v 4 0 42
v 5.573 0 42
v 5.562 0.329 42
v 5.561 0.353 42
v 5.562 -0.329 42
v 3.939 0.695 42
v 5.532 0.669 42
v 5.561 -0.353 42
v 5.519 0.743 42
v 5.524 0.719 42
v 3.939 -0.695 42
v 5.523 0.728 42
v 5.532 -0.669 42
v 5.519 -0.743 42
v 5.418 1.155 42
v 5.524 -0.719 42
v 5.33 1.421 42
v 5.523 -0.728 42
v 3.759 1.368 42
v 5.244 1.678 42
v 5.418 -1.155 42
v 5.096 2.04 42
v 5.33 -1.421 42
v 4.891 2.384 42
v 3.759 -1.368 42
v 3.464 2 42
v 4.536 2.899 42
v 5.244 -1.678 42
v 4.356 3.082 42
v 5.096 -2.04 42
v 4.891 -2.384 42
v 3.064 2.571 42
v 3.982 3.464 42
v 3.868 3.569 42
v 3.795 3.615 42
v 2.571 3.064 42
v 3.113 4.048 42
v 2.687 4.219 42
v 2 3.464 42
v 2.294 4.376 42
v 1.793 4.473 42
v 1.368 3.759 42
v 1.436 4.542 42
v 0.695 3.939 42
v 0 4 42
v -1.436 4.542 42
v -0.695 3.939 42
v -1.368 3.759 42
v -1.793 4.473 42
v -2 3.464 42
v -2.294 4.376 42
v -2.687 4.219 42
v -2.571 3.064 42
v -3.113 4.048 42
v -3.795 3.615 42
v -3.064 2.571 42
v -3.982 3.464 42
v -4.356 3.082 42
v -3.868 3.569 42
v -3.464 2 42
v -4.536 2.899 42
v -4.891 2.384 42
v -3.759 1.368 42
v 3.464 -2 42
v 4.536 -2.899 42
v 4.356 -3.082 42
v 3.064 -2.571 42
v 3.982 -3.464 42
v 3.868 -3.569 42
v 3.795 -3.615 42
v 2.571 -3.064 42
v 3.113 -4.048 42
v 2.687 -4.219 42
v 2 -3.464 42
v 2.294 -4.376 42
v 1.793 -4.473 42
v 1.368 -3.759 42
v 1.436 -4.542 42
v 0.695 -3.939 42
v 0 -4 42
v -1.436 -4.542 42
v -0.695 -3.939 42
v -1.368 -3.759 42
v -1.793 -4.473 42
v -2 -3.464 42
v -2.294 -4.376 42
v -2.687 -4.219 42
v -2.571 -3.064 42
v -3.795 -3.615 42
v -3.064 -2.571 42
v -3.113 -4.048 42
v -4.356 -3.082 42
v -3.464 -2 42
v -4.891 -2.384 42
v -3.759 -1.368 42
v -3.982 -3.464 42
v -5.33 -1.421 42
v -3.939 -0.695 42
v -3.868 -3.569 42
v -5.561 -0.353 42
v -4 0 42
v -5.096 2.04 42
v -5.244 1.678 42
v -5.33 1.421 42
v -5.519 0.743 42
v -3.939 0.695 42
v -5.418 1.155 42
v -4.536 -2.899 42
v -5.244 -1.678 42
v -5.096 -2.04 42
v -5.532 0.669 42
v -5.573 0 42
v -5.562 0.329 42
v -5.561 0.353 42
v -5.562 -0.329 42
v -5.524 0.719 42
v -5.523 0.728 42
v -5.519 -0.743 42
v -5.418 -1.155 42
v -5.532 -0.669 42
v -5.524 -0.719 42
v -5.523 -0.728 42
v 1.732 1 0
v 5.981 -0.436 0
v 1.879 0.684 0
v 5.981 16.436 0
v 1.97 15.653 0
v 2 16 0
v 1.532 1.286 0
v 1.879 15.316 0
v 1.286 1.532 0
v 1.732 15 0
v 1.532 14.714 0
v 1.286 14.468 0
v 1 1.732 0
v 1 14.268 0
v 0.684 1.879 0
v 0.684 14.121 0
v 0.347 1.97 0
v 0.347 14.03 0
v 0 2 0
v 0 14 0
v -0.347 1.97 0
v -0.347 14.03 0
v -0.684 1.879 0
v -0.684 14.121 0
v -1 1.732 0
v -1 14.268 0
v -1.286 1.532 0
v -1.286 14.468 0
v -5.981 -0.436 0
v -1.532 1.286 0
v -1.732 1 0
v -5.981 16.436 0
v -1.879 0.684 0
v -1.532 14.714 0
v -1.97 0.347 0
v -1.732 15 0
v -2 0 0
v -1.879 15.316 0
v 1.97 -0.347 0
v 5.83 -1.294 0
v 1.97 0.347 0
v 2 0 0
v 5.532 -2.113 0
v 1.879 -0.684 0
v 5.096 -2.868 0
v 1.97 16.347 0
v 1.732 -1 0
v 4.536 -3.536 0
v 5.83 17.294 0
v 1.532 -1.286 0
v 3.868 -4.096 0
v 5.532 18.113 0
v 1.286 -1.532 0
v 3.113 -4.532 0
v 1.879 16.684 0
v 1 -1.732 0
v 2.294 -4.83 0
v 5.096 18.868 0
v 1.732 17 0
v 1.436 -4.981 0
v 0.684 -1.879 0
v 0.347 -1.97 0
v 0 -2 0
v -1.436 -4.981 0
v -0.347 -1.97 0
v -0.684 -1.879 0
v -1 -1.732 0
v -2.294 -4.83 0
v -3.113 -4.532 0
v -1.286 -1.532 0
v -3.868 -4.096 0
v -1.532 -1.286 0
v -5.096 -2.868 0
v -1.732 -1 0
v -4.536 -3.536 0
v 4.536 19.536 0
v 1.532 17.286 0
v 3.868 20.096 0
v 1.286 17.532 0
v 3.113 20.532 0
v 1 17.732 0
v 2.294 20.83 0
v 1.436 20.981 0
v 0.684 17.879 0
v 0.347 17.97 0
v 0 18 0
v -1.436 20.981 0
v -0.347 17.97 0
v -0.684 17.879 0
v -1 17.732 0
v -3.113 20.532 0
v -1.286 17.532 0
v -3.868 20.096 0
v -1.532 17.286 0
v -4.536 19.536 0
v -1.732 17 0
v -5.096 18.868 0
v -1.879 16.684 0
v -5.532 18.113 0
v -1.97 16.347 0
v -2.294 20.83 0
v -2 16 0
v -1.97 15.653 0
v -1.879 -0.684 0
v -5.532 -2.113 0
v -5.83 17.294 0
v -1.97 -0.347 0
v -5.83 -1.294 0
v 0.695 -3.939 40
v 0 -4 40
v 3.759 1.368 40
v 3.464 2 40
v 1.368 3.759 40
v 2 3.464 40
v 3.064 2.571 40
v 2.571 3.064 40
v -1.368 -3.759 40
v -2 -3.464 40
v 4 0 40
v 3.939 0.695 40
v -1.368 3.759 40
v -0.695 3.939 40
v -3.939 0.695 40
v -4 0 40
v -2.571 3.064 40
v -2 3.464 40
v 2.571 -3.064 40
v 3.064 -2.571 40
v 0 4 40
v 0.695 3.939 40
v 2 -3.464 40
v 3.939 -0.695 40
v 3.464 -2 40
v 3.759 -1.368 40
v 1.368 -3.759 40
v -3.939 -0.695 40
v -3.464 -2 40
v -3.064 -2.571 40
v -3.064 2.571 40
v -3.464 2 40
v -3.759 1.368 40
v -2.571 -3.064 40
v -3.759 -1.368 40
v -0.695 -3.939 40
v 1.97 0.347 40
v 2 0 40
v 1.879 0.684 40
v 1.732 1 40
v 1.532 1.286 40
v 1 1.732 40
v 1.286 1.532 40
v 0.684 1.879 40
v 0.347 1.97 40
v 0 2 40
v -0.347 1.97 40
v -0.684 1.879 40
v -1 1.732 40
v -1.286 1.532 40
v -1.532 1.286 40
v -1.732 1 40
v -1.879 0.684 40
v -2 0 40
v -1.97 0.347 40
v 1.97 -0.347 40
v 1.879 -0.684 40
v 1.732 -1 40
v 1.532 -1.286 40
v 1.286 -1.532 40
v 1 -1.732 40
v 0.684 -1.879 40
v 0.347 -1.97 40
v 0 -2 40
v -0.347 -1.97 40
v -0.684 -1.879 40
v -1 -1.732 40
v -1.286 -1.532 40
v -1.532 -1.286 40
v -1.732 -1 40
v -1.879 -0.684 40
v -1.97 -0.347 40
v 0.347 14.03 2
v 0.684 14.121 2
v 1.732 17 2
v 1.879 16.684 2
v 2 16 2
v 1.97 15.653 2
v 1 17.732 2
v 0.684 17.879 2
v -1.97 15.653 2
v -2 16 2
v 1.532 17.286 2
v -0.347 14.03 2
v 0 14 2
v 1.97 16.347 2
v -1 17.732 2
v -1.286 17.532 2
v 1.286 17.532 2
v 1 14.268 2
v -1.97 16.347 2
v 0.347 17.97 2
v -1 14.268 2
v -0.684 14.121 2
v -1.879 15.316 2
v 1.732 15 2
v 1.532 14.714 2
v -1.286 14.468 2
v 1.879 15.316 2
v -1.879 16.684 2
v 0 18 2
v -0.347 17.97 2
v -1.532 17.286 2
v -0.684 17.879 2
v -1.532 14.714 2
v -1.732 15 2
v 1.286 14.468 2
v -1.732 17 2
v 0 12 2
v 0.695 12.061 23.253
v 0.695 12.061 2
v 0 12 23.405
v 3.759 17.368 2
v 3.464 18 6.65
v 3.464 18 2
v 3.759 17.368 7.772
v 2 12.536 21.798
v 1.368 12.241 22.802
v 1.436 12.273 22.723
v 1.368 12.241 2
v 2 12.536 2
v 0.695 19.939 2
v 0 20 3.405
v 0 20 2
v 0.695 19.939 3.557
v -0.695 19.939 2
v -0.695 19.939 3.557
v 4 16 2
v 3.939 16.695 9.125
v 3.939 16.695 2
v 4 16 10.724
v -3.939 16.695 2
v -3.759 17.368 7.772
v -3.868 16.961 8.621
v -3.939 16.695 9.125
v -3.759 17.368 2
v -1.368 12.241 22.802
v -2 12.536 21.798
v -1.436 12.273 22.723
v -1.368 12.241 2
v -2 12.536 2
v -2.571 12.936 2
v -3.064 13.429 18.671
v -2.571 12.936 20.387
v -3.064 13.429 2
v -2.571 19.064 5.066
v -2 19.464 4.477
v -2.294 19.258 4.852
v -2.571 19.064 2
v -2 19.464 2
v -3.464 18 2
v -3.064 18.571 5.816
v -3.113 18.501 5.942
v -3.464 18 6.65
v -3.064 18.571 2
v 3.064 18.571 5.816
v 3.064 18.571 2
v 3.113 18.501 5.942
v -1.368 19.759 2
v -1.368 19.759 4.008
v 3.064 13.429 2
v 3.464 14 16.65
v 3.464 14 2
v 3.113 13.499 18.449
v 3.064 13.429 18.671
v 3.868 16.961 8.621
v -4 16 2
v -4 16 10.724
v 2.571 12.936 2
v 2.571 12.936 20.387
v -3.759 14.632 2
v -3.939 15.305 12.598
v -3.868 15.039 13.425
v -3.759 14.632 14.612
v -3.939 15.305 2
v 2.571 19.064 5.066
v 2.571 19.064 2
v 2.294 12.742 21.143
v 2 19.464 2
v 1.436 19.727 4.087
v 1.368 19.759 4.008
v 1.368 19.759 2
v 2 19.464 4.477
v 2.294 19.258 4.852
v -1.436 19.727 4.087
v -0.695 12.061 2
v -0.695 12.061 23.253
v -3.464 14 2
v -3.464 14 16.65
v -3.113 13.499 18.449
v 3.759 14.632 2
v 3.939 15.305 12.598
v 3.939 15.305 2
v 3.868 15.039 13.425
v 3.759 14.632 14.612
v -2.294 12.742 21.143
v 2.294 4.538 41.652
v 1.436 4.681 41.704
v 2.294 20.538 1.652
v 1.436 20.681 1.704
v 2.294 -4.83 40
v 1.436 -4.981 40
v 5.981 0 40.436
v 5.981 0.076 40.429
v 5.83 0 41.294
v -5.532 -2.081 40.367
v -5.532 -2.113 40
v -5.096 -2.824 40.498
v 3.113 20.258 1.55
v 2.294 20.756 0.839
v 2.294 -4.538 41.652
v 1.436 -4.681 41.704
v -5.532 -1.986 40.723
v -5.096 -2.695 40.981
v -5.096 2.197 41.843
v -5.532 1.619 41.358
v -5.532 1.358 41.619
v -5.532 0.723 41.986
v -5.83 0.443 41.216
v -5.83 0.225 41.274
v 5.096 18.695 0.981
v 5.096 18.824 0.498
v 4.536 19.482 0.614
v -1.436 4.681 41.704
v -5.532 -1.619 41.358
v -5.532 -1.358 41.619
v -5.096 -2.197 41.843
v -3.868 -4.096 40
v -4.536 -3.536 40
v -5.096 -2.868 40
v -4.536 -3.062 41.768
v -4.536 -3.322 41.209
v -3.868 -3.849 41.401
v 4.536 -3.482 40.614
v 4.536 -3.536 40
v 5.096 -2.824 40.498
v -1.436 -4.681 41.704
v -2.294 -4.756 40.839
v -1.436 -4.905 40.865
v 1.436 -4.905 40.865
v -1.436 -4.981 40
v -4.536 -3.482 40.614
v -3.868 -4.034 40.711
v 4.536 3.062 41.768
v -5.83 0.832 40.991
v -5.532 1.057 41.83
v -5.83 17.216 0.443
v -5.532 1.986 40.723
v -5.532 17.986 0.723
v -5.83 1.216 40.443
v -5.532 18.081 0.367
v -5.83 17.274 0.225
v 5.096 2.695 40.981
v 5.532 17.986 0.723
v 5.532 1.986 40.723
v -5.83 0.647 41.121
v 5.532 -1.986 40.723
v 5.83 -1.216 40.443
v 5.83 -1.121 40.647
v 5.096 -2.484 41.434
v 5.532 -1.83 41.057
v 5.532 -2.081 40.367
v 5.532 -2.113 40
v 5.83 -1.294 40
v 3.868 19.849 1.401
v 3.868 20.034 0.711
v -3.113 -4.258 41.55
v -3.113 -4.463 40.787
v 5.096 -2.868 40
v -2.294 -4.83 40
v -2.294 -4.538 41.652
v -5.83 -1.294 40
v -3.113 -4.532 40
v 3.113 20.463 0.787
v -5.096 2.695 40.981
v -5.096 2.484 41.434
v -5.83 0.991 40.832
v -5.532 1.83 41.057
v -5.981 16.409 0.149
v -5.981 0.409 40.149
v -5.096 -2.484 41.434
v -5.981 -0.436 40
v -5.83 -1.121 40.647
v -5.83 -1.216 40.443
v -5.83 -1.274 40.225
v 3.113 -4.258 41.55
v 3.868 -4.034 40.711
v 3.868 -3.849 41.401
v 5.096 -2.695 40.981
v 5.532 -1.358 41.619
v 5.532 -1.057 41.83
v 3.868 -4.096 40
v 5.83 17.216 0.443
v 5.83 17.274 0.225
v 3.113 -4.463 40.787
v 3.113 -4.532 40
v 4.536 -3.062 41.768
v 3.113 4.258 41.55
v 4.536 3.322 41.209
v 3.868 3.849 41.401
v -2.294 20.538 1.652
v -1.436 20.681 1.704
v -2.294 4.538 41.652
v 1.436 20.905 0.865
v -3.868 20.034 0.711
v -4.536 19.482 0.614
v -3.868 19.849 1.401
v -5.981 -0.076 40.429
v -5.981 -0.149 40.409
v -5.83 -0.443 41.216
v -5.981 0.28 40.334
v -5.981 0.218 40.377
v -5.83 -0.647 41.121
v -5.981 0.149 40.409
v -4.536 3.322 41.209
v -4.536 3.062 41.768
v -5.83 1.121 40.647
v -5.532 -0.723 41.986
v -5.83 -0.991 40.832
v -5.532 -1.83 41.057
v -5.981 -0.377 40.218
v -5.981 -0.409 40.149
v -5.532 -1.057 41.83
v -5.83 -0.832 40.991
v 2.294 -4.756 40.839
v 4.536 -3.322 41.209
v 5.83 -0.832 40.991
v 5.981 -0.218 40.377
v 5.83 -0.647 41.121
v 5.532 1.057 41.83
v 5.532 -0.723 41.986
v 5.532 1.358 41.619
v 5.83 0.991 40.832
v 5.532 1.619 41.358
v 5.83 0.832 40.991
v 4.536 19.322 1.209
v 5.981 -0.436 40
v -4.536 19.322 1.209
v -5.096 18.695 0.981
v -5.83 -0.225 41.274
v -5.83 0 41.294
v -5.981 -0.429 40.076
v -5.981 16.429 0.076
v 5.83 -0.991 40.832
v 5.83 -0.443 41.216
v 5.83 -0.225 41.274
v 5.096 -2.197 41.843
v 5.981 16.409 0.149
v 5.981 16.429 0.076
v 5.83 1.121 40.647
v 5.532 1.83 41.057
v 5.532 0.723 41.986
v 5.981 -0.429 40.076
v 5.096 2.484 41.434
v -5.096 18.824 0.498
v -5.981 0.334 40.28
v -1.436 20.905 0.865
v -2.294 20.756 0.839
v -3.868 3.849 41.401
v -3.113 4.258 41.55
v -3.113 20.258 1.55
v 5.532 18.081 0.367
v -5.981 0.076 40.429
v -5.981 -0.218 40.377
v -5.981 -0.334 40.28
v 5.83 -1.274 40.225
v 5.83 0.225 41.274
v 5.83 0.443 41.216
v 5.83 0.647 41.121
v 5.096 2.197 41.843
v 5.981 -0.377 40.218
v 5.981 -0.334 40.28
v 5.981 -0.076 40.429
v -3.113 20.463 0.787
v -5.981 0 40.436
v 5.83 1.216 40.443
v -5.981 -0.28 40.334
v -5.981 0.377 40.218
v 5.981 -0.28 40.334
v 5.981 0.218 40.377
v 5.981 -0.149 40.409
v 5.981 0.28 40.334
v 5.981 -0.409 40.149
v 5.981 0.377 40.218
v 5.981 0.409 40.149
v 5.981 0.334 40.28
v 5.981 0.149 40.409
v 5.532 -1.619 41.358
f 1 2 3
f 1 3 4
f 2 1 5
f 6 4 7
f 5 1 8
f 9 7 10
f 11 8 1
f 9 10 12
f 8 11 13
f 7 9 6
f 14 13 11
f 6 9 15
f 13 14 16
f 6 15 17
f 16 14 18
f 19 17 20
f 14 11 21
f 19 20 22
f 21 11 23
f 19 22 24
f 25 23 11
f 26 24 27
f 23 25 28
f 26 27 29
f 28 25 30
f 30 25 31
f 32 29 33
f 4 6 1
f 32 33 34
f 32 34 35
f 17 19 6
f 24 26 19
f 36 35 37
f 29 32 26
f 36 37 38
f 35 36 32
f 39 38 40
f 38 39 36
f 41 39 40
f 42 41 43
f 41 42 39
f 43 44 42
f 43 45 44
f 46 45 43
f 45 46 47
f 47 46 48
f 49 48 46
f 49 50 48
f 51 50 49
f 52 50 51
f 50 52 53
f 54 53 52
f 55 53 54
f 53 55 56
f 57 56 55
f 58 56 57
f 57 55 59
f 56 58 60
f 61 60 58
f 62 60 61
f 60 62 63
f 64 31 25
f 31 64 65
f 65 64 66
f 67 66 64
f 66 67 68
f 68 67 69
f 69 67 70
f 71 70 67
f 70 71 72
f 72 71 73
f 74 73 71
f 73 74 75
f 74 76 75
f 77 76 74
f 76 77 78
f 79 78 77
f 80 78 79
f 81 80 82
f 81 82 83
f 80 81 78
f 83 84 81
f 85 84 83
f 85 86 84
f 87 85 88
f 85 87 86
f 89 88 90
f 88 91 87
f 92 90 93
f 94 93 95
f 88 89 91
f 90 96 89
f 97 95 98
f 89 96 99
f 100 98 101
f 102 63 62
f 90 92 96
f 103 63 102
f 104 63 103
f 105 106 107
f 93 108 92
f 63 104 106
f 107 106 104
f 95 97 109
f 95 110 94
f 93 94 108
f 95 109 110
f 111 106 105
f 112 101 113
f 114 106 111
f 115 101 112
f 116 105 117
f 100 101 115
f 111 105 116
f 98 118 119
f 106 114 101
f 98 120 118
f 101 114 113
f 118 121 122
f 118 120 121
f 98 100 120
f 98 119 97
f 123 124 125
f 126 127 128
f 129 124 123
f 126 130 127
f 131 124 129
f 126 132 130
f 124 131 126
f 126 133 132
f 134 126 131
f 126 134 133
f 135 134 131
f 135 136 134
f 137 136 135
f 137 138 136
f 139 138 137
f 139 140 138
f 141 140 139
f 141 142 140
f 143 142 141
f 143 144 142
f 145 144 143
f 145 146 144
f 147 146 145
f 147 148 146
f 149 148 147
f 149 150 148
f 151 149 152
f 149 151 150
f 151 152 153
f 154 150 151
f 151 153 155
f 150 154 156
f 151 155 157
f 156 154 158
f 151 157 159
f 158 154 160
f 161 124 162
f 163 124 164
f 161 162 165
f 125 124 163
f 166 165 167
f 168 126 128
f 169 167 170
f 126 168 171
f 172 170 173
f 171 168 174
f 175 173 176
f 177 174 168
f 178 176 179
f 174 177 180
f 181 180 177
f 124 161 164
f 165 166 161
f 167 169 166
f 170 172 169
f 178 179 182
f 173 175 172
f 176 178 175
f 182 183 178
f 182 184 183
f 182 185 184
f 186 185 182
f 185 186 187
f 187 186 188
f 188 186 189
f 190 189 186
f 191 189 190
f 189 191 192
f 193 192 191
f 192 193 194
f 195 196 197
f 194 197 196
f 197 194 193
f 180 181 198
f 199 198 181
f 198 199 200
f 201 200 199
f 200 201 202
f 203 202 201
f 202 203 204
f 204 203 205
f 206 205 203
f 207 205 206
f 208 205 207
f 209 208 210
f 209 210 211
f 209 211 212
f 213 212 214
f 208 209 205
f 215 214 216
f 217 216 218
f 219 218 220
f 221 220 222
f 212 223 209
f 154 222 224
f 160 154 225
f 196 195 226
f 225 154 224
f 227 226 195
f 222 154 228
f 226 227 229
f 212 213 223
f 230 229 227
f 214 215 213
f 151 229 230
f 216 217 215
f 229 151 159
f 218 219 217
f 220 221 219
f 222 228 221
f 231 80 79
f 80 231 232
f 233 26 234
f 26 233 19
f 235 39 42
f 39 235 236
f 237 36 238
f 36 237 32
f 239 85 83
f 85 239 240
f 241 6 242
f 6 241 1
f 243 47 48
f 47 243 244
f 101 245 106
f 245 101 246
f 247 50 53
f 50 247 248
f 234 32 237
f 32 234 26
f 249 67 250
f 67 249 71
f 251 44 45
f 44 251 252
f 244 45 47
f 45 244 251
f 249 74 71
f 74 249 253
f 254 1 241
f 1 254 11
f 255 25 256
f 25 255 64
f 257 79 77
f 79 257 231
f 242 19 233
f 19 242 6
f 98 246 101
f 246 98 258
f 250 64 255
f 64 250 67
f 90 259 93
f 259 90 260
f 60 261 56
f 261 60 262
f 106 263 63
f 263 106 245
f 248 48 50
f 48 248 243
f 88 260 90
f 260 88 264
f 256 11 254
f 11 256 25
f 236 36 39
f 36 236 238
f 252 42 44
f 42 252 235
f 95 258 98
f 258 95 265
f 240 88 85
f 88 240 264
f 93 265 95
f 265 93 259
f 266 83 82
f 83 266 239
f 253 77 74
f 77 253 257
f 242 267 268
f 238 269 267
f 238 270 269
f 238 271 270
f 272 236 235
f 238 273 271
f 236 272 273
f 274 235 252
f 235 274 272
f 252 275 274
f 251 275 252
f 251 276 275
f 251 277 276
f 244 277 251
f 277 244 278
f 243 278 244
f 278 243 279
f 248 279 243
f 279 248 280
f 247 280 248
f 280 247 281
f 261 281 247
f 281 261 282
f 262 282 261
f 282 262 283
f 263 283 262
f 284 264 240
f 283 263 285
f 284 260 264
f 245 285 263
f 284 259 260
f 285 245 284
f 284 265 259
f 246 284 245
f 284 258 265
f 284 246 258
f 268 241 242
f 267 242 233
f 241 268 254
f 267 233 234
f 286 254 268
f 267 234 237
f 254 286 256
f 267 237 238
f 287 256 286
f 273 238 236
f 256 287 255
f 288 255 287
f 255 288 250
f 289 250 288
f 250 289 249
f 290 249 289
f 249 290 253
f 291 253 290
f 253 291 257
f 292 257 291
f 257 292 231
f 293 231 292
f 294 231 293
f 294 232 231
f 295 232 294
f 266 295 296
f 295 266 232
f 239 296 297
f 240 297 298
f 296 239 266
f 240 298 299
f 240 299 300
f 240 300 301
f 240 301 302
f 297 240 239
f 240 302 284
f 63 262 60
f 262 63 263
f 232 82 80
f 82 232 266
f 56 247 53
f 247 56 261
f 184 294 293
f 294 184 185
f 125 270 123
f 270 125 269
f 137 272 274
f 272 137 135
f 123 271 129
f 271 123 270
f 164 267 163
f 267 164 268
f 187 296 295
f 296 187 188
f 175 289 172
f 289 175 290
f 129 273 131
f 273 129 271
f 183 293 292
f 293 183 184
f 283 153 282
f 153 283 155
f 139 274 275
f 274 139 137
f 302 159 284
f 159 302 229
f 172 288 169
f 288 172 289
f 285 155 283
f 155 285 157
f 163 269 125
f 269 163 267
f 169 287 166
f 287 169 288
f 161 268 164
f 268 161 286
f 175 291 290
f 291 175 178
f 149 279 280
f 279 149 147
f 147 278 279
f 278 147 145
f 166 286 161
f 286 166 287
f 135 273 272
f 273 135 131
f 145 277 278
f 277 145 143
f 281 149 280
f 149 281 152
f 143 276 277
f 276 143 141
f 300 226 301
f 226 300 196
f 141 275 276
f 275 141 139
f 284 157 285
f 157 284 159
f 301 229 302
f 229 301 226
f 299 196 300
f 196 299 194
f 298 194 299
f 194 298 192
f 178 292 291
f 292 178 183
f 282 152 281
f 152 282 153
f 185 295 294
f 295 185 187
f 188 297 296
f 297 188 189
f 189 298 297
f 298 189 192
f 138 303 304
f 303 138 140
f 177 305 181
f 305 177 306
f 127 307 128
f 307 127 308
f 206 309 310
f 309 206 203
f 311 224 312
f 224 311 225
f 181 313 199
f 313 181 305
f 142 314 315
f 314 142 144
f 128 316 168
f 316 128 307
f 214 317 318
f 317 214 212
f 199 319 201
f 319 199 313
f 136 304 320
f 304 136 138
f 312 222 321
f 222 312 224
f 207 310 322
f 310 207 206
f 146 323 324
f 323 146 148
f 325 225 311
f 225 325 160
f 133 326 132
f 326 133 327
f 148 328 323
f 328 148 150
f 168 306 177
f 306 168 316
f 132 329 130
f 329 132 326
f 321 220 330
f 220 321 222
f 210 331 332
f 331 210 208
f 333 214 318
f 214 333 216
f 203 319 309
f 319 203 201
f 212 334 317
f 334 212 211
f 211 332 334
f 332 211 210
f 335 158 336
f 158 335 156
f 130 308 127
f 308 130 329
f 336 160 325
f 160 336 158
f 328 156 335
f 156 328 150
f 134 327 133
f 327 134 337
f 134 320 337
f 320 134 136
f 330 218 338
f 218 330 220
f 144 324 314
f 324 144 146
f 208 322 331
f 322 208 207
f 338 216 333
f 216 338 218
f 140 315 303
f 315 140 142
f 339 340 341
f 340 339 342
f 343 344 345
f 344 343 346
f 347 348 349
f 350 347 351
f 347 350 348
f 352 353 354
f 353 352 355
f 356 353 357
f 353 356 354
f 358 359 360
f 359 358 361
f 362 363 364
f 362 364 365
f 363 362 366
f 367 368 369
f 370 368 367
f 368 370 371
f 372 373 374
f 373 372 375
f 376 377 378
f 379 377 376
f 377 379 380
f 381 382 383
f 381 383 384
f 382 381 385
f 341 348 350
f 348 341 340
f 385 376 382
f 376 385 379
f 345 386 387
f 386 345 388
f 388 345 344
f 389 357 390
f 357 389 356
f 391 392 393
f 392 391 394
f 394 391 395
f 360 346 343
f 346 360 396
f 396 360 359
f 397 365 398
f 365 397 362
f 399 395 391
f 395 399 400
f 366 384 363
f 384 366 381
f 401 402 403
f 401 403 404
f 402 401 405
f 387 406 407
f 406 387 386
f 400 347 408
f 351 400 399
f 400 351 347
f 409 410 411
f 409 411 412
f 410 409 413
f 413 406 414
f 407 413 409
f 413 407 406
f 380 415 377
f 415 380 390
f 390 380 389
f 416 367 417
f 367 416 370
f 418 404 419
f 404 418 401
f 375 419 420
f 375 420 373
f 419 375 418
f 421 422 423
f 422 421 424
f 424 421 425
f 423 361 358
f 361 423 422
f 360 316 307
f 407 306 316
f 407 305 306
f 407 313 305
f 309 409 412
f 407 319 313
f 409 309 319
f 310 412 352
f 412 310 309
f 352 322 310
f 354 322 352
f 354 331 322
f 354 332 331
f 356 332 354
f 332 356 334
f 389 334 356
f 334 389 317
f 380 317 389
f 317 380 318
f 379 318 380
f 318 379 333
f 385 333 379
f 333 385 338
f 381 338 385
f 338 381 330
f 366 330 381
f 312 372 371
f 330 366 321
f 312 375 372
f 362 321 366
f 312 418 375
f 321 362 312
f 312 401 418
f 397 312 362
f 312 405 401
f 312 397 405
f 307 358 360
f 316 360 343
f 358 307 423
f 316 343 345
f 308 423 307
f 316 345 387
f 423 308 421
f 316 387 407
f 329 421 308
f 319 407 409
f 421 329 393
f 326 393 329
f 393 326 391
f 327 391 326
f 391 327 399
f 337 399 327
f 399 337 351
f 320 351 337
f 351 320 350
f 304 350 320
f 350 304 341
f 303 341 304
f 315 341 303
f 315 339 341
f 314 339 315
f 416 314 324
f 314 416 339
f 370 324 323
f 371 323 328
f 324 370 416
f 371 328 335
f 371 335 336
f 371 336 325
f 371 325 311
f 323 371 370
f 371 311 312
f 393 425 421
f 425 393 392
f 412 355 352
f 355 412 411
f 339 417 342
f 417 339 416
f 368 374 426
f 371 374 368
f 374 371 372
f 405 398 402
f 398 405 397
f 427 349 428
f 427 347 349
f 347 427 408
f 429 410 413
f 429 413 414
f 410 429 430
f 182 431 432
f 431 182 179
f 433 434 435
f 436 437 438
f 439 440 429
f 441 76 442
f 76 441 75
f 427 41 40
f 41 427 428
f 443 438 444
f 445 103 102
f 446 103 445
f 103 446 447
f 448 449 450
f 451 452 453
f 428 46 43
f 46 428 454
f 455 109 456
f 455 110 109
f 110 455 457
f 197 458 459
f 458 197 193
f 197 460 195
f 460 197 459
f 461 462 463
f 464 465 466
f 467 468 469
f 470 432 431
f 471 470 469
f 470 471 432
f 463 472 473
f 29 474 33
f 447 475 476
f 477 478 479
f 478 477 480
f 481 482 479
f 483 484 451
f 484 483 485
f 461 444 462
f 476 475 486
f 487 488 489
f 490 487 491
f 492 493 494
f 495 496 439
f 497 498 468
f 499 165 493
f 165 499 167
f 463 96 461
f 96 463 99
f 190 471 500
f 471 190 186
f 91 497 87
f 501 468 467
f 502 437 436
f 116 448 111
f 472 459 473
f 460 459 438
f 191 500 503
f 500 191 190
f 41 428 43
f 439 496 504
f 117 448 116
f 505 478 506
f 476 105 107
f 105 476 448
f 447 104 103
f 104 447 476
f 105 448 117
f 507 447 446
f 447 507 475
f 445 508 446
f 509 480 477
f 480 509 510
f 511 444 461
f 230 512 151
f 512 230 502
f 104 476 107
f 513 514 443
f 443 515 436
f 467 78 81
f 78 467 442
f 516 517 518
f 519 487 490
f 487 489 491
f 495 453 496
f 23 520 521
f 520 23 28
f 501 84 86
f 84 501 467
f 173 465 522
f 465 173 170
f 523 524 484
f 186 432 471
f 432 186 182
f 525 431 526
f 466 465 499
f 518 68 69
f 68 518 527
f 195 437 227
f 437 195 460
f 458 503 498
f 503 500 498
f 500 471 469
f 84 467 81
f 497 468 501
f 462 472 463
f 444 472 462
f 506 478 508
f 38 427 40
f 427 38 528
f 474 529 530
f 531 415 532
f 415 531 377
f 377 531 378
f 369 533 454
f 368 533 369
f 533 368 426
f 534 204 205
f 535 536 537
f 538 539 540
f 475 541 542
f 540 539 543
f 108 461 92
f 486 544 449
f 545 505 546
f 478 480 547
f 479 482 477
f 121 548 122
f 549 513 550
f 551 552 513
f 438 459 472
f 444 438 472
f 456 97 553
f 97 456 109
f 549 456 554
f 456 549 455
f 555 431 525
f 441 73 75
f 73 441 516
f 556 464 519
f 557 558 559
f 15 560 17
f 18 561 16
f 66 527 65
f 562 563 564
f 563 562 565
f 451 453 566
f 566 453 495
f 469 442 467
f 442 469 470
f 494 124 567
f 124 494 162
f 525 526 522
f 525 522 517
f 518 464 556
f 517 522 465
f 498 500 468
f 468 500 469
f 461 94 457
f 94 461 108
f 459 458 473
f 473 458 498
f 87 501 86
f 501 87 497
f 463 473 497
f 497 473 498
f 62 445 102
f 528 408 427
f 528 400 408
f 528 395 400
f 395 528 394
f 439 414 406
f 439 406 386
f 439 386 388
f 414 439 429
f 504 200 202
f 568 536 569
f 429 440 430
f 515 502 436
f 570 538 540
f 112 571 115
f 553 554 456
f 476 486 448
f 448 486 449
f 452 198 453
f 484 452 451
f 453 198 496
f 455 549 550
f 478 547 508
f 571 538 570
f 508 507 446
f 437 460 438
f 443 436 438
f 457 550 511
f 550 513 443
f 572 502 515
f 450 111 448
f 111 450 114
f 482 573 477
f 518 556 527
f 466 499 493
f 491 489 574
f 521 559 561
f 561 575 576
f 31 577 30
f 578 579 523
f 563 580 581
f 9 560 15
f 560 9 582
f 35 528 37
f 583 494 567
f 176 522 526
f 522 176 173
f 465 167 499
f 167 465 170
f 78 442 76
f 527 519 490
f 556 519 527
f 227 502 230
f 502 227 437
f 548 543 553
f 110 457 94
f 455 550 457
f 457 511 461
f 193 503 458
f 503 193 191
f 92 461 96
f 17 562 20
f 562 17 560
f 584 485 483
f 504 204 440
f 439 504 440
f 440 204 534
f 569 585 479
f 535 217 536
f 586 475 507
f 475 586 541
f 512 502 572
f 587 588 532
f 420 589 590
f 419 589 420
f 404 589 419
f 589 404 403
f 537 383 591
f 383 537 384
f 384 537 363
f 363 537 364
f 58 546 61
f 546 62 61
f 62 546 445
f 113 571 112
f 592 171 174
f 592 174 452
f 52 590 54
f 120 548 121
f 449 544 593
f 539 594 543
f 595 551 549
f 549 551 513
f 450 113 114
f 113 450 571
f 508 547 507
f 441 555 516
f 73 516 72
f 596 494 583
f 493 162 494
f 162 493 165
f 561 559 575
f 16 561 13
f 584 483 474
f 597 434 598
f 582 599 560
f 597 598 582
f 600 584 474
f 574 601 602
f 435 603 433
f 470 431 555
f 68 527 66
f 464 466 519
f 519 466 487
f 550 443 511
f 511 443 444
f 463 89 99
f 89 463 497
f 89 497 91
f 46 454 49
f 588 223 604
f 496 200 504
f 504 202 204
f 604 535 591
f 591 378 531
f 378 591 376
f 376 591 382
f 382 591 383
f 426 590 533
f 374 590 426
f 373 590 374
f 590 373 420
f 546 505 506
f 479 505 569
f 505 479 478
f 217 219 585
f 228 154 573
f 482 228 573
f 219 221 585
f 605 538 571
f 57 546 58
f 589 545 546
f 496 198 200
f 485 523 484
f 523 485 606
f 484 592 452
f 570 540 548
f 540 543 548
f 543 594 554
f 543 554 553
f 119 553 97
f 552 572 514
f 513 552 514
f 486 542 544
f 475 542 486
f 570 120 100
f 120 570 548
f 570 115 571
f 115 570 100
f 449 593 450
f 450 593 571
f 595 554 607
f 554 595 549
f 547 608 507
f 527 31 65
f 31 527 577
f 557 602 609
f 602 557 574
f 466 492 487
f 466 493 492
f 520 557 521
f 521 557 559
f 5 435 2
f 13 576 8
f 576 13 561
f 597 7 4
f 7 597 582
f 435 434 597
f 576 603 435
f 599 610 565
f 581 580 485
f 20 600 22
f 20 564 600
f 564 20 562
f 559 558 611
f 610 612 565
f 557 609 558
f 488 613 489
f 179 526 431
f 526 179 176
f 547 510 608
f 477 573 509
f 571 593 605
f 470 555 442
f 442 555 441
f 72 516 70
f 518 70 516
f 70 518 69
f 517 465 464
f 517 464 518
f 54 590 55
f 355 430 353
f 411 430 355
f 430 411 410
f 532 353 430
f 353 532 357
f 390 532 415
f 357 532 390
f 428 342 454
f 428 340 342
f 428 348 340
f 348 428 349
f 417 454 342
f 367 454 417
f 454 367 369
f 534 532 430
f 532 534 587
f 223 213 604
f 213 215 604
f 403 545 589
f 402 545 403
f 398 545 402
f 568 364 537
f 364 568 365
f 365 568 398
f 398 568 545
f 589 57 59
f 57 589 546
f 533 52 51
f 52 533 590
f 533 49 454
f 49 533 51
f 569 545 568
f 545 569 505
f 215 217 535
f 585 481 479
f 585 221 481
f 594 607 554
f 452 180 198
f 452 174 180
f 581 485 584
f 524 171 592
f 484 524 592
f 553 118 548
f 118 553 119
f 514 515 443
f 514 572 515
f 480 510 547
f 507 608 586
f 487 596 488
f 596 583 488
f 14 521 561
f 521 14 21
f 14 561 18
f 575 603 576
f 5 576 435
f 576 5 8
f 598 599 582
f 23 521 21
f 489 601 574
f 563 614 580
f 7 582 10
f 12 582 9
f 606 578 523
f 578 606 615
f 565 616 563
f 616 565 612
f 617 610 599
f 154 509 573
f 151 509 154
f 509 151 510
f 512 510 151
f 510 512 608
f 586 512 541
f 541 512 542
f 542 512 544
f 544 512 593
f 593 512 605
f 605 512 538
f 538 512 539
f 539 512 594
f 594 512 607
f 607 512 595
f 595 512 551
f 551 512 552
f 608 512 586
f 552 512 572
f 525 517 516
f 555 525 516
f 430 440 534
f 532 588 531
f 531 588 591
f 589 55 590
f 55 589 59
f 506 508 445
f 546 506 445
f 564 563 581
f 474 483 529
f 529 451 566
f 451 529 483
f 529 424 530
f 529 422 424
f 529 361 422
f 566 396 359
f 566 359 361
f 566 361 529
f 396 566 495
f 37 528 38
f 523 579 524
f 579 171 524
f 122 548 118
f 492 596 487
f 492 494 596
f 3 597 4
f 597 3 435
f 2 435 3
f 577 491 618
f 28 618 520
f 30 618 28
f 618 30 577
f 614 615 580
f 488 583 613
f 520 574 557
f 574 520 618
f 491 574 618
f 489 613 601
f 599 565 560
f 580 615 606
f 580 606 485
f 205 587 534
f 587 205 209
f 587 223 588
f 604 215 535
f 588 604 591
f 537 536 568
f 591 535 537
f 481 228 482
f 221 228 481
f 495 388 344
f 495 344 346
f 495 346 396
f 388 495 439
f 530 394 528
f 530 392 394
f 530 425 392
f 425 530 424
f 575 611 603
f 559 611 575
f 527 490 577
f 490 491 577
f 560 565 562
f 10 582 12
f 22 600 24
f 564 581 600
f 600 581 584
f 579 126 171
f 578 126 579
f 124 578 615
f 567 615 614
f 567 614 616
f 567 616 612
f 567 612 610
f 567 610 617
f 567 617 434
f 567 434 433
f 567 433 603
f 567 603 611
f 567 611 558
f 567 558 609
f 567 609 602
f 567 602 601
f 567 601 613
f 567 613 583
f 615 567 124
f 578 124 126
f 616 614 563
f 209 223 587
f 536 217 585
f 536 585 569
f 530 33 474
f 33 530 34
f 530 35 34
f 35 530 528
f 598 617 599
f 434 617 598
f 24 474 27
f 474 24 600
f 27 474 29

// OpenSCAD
$fn = 36;

Base=2;
Depth = 16;
Height = 40;

Flat = 2;
Width = 12;

rotate([0,-90,0])
difference () {
    union () {
        minkowski() {
            translate([0,0,-Flat/2])
            linear_extrude(height=Flat)
            polygon([[0,0],[Height,0],[0,Depth]]);
            sphere(r=(Width -Flat)/2);
        }
    }
    
    union() {
        translate([Height+2,-50,-50])
           cube([100,100,100]);
        translate([-100,-50,-50])
            cube([100,100,100]);
        
        rotate([0,90,0])
            translate([0,0,40])
                cylinder(r=4,h=100);

        rotate([0,90,0])
            translate([0,0,-1])
                cylinder(r=2,h=100);
        translate([0,16,0])
        rotate([0,90,0])
            translate([0,0,-1])
                cylinder(r=2,h=100);
        
        translate([0,16,0])
            rotate([0,90,0])
                translate([0,0,Base])
                    cylinder(r=4,h=100);
        
    }
}
